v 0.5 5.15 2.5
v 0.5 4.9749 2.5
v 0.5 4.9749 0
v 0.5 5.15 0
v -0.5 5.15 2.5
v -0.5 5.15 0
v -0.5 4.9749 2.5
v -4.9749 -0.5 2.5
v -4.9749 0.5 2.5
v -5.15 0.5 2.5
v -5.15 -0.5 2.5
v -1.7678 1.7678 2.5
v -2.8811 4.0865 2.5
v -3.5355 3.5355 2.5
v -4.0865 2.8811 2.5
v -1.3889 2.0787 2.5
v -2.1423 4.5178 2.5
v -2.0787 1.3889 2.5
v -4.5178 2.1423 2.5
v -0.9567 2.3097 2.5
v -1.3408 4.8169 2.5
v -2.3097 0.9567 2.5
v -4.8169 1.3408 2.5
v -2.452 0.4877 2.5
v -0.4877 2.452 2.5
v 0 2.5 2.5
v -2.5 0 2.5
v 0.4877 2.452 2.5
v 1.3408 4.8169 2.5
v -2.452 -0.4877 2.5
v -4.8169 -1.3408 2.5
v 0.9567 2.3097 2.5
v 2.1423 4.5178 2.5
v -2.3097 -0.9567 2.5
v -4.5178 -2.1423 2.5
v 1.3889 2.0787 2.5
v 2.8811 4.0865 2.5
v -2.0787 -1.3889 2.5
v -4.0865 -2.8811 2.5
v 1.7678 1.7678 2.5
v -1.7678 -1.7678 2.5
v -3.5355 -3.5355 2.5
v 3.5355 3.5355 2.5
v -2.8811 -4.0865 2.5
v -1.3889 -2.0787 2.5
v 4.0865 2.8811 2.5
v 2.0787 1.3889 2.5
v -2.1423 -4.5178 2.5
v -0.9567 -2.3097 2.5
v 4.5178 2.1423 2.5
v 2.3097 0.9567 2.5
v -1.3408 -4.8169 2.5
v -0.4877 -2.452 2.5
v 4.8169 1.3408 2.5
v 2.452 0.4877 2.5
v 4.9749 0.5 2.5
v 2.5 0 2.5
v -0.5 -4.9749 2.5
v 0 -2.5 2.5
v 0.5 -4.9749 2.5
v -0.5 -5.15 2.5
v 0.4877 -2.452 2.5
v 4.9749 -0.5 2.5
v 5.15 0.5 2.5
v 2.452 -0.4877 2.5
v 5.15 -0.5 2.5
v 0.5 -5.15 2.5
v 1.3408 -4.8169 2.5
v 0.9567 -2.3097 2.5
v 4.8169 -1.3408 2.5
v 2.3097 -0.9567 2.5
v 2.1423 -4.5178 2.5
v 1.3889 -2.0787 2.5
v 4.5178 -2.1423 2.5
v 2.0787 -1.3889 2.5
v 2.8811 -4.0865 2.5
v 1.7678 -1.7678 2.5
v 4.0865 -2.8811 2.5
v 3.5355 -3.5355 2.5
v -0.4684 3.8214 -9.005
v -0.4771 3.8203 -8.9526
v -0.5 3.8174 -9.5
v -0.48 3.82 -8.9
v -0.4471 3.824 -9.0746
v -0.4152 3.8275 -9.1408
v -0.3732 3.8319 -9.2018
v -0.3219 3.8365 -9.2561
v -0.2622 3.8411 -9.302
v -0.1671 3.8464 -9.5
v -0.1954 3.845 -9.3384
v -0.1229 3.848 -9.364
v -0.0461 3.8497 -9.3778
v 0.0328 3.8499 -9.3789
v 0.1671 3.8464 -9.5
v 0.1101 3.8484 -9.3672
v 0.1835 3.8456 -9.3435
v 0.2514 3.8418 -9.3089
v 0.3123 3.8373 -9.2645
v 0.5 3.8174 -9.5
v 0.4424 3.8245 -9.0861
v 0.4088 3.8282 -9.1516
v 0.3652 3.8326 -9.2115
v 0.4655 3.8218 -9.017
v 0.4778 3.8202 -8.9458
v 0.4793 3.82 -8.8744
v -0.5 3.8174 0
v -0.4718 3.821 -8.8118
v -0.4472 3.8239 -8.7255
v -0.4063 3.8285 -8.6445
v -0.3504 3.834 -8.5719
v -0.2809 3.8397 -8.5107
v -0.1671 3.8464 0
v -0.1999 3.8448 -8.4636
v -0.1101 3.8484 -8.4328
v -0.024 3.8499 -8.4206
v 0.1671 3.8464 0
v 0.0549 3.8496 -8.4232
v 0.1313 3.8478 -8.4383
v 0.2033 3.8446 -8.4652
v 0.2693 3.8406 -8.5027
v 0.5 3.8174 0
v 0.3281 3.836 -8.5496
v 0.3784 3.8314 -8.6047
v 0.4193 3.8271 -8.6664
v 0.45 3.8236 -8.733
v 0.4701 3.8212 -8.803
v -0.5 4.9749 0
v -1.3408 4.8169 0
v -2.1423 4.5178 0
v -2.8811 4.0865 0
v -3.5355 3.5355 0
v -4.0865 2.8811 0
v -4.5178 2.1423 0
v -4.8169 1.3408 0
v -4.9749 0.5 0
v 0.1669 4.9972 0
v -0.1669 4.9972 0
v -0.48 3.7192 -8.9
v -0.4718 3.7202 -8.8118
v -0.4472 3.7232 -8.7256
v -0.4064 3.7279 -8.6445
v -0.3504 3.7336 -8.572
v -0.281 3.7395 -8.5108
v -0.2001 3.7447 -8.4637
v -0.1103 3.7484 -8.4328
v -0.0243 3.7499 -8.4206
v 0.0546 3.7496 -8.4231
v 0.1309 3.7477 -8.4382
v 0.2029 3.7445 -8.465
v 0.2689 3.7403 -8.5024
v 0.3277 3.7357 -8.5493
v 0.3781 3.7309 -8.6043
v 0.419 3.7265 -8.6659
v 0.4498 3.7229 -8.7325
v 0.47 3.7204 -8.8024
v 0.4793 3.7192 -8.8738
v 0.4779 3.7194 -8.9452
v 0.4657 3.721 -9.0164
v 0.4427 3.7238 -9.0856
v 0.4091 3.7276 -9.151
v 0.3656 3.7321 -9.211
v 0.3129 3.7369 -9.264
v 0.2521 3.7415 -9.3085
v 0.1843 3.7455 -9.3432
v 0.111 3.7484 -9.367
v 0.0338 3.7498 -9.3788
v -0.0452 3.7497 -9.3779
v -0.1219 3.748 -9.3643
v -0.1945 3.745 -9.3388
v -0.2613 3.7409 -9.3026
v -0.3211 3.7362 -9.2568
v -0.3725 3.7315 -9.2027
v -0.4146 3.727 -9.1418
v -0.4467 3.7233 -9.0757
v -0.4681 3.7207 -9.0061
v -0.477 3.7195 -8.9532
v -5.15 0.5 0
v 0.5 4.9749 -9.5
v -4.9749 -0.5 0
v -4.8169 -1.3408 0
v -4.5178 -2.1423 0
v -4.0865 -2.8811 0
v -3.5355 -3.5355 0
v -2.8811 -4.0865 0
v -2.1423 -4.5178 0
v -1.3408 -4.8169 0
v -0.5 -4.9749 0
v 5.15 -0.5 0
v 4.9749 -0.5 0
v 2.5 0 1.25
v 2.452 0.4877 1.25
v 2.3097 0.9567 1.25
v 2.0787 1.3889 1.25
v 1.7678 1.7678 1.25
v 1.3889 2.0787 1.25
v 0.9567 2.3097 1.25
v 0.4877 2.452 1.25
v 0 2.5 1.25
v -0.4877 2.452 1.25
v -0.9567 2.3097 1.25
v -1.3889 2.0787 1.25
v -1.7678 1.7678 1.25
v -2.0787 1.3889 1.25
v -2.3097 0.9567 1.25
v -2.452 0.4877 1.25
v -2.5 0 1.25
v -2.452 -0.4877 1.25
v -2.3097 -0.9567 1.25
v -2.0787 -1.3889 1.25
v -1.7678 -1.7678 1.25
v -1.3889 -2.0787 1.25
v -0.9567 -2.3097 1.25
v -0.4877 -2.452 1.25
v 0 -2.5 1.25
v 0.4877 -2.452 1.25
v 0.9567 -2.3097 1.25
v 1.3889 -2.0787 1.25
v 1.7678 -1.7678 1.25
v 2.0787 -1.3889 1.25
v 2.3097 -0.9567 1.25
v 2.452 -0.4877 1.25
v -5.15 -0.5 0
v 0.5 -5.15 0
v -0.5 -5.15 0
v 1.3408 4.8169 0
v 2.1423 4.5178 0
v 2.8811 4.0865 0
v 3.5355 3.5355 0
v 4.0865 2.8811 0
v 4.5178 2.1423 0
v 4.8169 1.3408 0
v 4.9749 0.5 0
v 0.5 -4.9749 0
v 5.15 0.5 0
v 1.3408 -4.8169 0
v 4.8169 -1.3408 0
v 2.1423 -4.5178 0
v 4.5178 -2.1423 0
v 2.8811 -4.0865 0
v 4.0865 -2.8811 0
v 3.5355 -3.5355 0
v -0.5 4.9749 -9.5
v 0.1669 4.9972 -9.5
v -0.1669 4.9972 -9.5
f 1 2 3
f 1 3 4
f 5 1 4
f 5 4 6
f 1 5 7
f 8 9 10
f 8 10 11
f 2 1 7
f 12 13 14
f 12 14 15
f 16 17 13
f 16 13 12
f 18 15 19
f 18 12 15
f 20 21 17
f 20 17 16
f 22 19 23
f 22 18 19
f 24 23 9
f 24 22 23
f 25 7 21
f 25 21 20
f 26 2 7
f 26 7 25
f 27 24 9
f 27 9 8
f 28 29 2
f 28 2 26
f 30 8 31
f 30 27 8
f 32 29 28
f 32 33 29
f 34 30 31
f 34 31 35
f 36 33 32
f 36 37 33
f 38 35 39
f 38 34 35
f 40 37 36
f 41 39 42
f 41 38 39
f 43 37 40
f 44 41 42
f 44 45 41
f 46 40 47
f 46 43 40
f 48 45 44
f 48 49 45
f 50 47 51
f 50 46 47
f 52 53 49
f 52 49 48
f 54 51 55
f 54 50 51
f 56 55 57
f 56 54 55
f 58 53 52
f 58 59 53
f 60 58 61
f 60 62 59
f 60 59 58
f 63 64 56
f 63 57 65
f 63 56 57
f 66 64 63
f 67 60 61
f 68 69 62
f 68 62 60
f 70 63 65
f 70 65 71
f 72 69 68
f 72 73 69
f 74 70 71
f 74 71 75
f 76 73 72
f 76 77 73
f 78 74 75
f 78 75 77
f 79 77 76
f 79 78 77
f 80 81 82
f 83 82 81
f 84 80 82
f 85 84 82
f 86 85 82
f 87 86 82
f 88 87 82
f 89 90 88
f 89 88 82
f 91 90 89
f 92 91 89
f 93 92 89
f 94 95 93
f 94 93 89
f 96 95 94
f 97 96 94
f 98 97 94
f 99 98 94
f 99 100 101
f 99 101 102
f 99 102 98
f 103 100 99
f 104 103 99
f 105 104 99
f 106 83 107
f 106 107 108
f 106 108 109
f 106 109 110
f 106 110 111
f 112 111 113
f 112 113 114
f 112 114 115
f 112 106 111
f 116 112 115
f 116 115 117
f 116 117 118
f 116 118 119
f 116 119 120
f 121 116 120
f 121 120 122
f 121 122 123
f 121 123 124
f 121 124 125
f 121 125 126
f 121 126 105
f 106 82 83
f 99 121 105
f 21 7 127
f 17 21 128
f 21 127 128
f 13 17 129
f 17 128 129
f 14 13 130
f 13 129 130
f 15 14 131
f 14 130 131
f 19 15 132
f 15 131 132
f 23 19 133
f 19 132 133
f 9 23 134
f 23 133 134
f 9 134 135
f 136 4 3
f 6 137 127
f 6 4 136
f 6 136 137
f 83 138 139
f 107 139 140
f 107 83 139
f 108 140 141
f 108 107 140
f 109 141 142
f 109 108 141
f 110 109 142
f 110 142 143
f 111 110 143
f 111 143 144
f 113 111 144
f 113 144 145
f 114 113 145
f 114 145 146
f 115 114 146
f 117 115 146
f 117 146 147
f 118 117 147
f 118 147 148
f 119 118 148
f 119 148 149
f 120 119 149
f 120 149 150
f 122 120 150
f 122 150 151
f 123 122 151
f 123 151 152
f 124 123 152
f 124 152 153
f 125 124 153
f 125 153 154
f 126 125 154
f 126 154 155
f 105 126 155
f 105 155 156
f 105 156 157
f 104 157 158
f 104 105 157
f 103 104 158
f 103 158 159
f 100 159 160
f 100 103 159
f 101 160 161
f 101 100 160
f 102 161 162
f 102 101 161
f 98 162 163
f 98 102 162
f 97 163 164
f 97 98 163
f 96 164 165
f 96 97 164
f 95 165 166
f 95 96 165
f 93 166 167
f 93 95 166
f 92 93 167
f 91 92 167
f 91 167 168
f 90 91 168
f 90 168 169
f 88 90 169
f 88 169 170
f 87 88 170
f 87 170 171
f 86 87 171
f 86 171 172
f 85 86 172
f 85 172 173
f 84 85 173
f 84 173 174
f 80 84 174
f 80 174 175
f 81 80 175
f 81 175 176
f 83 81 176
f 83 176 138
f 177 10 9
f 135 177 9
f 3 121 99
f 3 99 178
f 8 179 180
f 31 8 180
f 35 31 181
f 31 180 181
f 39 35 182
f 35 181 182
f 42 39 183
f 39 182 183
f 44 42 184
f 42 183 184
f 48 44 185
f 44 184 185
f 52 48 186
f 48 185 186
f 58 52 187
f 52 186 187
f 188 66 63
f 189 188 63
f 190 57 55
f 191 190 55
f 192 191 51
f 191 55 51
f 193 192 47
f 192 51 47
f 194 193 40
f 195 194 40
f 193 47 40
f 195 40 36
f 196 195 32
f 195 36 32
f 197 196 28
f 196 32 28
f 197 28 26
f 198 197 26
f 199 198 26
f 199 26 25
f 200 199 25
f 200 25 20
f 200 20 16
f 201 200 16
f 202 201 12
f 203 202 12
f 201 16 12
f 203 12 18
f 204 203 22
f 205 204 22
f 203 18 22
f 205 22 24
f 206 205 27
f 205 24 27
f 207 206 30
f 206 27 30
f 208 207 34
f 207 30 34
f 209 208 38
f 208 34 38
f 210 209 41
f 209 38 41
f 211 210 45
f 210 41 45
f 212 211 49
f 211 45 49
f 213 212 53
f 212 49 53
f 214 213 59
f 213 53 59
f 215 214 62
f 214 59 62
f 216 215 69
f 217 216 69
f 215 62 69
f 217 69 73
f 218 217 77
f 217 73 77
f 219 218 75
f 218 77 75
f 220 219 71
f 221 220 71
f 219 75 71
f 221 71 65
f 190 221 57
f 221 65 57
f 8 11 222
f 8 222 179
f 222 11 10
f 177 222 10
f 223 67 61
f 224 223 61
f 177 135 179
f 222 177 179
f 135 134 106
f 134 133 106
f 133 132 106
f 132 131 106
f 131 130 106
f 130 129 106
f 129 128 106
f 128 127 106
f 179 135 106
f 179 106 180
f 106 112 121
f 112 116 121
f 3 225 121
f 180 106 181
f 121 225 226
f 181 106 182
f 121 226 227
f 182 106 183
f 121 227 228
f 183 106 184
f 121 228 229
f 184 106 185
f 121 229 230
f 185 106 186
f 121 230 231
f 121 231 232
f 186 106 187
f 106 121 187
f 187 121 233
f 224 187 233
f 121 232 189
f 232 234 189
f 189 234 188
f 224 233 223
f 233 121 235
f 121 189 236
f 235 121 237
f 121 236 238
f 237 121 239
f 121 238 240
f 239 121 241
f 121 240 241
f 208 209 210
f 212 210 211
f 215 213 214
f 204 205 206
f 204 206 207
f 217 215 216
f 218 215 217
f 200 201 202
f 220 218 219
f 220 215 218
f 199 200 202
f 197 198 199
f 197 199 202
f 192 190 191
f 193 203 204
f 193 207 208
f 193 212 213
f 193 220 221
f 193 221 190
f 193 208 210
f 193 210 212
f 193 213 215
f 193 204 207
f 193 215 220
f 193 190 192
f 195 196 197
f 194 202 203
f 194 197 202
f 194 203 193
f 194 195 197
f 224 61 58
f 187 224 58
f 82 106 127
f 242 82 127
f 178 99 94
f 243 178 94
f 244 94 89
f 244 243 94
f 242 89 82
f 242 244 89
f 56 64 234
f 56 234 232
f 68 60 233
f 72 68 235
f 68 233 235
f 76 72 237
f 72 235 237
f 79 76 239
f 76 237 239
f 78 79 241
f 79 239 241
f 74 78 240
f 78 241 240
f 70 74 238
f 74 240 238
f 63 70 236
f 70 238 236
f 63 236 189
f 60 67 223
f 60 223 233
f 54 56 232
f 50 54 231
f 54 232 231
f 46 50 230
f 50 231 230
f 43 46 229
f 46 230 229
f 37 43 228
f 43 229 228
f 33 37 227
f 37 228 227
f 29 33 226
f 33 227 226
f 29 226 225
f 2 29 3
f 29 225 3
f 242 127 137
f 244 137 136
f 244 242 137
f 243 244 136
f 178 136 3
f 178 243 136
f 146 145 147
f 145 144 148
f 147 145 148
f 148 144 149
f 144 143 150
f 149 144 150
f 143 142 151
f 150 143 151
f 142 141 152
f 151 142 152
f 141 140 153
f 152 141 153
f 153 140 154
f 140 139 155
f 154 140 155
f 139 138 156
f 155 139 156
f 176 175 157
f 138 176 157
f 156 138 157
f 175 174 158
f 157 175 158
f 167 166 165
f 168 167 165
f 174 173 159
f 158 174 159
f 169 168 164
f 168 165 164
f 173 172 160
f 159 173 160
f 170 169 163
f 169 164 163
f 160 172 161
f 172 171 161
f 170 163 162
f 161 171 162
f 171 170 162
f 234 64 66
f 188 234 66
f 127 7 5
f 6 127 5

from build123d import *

# Parameters (mm, degrees)
SKETCH1_R           = 5
BOSS_EXTRUDE1_DEPTH = 2.5
SKETCH6_W           = 0.25
SKETCH6_H           = 1
BOSS_EXTRUDE4_DEPTH = 2.5
CIRPATTERN1_COUNT   = 4
SKETCH8_R           = 2.5
CUT_EXTRUDE3_DEPTH  = 1.25
SKETCH9_W           = 1
SKETCH9_H           = 1.35
BOSS_EXTRUDE5_DEPTH = 9.5
SKETCH11_R          = 3.85
CUT_EXTRUDE4_DEPTH  = 14
SKETCH12_R          = 0.48
BOSS_EXTRUDE6_DEPTH = 7
SKETCH13_R          = 3.75
CUT_EXTRUDE5_DEPTH  = 7
CUT_EXTRUDE6_START  = 17
SKETCH14_R          = 6.794989929
SKETCH14_R_2        = 5
CUT_EXTRUDE6_DEPTH  = 17


with BuildPart() as part:
    # Sketch1 → Boss-Extrude1 (new body)
    with BuildSketch(Plane.XY):
        Circle(SKETCH1_R)
    extrude(amount=BOSS_EXTRUDE1_DEPTH)

    # Sketch6 → Boss-Extrude4 (add)
    with BuildSketch(Plane.XY.offset(2.5)):
        with Locations((-5.025, 0)):
            Rectangle(SKETCH6_W, SKETCH6_H)
    boss_extrude4 = extrude(amount=-BOSS_EXTRUDE4_DEPTH)

    # CirPattern1: Boss-Extrude4 ×4 about axis
    cirpattern1_axis = Axis((0, 0, 0), (0, 0, 1))
    for i in range(1, CIRPATTERN1_COUNT):
        add(boss_extrude4.rotate(cirpattern1_axis, i * 360 / CIRPATTERN1_COUNT))

    # Sketch8 → Cut-Extrude3 (cut)
    with BuildSketch(Plane.XY.offset(2.5)):
        Circle(SKETCH8_R)
    extrude(amount=-CUT_EXTRUDE3_DEPTH, mode=Mode.SUBTRACT)

    # Sketch9 → Boss-Extrude5 (add)
    with BuildSketch(Plane(origin=(0, 0, 0), x_dir=(-1, 0, 0), z_dir=(0, 0, -1))):
        with Locations((0, 4.475)):
            Rectangle(SKETCH9_W, SKETCH9_H)
    extrude(amount=BOSS_EXTRUDE5_DEPTH)

    # Sketch11 → Cut-Extrude4 (cut)
    with BuildSketch(Plane(origin=(0, 0, 0), x_dir=(-1, 0, 0), z_dir=(0, 0, -1))):
        Circle(SKETCH11_R)
    extrude(amount=CUT_EXTRUDE4_DEPTH, mode=Mode.SUBTRACT)

    # Sketch12 → Boss-Extrude6 (add)
    with BuildSketch(Plane(origin=(0, 5.15, 0), x_dir=(1, 0, 0), z_dir=(0, 1, 0))):
        with Locations(Location((0, 8.9, 0), (0, 0, 180))):
            Circle(SKETCH12_R)
    extrude(amount=-BOSS_EXTRUDE6_DEPTH)

    # Sketch13 → Cut-Extrude5 (cut)
    with BuildSketch(Plane(origin=(0, 0, -9.5), x_dir=(-1, 0, 0), z_dir=(0, 0, -1))):
        Circle(SKETCH13_R)
    extrude(amount=-CUT_EXTRUDE5_DEPTH, mode=Mode.SUBTRACT)

    # Sketch14 → Cut-Extrude6 (cut)
    with BuildSketch(Plane(origin=(0, 0, 0), x_dir=(-1, 0, 0), z_dir=(0, 0, -1)).offset(CUT_EXTRUDE6_START)):
        Circle(SKETCH14_R)
        Circle(SKETCH14_R_2, mode=Mode.SUBTRACT)
    extrude(amount=-CUT_EXTRUDE6_DEPTH, mode=Mode.SUBTRACT)


solid = part.part
